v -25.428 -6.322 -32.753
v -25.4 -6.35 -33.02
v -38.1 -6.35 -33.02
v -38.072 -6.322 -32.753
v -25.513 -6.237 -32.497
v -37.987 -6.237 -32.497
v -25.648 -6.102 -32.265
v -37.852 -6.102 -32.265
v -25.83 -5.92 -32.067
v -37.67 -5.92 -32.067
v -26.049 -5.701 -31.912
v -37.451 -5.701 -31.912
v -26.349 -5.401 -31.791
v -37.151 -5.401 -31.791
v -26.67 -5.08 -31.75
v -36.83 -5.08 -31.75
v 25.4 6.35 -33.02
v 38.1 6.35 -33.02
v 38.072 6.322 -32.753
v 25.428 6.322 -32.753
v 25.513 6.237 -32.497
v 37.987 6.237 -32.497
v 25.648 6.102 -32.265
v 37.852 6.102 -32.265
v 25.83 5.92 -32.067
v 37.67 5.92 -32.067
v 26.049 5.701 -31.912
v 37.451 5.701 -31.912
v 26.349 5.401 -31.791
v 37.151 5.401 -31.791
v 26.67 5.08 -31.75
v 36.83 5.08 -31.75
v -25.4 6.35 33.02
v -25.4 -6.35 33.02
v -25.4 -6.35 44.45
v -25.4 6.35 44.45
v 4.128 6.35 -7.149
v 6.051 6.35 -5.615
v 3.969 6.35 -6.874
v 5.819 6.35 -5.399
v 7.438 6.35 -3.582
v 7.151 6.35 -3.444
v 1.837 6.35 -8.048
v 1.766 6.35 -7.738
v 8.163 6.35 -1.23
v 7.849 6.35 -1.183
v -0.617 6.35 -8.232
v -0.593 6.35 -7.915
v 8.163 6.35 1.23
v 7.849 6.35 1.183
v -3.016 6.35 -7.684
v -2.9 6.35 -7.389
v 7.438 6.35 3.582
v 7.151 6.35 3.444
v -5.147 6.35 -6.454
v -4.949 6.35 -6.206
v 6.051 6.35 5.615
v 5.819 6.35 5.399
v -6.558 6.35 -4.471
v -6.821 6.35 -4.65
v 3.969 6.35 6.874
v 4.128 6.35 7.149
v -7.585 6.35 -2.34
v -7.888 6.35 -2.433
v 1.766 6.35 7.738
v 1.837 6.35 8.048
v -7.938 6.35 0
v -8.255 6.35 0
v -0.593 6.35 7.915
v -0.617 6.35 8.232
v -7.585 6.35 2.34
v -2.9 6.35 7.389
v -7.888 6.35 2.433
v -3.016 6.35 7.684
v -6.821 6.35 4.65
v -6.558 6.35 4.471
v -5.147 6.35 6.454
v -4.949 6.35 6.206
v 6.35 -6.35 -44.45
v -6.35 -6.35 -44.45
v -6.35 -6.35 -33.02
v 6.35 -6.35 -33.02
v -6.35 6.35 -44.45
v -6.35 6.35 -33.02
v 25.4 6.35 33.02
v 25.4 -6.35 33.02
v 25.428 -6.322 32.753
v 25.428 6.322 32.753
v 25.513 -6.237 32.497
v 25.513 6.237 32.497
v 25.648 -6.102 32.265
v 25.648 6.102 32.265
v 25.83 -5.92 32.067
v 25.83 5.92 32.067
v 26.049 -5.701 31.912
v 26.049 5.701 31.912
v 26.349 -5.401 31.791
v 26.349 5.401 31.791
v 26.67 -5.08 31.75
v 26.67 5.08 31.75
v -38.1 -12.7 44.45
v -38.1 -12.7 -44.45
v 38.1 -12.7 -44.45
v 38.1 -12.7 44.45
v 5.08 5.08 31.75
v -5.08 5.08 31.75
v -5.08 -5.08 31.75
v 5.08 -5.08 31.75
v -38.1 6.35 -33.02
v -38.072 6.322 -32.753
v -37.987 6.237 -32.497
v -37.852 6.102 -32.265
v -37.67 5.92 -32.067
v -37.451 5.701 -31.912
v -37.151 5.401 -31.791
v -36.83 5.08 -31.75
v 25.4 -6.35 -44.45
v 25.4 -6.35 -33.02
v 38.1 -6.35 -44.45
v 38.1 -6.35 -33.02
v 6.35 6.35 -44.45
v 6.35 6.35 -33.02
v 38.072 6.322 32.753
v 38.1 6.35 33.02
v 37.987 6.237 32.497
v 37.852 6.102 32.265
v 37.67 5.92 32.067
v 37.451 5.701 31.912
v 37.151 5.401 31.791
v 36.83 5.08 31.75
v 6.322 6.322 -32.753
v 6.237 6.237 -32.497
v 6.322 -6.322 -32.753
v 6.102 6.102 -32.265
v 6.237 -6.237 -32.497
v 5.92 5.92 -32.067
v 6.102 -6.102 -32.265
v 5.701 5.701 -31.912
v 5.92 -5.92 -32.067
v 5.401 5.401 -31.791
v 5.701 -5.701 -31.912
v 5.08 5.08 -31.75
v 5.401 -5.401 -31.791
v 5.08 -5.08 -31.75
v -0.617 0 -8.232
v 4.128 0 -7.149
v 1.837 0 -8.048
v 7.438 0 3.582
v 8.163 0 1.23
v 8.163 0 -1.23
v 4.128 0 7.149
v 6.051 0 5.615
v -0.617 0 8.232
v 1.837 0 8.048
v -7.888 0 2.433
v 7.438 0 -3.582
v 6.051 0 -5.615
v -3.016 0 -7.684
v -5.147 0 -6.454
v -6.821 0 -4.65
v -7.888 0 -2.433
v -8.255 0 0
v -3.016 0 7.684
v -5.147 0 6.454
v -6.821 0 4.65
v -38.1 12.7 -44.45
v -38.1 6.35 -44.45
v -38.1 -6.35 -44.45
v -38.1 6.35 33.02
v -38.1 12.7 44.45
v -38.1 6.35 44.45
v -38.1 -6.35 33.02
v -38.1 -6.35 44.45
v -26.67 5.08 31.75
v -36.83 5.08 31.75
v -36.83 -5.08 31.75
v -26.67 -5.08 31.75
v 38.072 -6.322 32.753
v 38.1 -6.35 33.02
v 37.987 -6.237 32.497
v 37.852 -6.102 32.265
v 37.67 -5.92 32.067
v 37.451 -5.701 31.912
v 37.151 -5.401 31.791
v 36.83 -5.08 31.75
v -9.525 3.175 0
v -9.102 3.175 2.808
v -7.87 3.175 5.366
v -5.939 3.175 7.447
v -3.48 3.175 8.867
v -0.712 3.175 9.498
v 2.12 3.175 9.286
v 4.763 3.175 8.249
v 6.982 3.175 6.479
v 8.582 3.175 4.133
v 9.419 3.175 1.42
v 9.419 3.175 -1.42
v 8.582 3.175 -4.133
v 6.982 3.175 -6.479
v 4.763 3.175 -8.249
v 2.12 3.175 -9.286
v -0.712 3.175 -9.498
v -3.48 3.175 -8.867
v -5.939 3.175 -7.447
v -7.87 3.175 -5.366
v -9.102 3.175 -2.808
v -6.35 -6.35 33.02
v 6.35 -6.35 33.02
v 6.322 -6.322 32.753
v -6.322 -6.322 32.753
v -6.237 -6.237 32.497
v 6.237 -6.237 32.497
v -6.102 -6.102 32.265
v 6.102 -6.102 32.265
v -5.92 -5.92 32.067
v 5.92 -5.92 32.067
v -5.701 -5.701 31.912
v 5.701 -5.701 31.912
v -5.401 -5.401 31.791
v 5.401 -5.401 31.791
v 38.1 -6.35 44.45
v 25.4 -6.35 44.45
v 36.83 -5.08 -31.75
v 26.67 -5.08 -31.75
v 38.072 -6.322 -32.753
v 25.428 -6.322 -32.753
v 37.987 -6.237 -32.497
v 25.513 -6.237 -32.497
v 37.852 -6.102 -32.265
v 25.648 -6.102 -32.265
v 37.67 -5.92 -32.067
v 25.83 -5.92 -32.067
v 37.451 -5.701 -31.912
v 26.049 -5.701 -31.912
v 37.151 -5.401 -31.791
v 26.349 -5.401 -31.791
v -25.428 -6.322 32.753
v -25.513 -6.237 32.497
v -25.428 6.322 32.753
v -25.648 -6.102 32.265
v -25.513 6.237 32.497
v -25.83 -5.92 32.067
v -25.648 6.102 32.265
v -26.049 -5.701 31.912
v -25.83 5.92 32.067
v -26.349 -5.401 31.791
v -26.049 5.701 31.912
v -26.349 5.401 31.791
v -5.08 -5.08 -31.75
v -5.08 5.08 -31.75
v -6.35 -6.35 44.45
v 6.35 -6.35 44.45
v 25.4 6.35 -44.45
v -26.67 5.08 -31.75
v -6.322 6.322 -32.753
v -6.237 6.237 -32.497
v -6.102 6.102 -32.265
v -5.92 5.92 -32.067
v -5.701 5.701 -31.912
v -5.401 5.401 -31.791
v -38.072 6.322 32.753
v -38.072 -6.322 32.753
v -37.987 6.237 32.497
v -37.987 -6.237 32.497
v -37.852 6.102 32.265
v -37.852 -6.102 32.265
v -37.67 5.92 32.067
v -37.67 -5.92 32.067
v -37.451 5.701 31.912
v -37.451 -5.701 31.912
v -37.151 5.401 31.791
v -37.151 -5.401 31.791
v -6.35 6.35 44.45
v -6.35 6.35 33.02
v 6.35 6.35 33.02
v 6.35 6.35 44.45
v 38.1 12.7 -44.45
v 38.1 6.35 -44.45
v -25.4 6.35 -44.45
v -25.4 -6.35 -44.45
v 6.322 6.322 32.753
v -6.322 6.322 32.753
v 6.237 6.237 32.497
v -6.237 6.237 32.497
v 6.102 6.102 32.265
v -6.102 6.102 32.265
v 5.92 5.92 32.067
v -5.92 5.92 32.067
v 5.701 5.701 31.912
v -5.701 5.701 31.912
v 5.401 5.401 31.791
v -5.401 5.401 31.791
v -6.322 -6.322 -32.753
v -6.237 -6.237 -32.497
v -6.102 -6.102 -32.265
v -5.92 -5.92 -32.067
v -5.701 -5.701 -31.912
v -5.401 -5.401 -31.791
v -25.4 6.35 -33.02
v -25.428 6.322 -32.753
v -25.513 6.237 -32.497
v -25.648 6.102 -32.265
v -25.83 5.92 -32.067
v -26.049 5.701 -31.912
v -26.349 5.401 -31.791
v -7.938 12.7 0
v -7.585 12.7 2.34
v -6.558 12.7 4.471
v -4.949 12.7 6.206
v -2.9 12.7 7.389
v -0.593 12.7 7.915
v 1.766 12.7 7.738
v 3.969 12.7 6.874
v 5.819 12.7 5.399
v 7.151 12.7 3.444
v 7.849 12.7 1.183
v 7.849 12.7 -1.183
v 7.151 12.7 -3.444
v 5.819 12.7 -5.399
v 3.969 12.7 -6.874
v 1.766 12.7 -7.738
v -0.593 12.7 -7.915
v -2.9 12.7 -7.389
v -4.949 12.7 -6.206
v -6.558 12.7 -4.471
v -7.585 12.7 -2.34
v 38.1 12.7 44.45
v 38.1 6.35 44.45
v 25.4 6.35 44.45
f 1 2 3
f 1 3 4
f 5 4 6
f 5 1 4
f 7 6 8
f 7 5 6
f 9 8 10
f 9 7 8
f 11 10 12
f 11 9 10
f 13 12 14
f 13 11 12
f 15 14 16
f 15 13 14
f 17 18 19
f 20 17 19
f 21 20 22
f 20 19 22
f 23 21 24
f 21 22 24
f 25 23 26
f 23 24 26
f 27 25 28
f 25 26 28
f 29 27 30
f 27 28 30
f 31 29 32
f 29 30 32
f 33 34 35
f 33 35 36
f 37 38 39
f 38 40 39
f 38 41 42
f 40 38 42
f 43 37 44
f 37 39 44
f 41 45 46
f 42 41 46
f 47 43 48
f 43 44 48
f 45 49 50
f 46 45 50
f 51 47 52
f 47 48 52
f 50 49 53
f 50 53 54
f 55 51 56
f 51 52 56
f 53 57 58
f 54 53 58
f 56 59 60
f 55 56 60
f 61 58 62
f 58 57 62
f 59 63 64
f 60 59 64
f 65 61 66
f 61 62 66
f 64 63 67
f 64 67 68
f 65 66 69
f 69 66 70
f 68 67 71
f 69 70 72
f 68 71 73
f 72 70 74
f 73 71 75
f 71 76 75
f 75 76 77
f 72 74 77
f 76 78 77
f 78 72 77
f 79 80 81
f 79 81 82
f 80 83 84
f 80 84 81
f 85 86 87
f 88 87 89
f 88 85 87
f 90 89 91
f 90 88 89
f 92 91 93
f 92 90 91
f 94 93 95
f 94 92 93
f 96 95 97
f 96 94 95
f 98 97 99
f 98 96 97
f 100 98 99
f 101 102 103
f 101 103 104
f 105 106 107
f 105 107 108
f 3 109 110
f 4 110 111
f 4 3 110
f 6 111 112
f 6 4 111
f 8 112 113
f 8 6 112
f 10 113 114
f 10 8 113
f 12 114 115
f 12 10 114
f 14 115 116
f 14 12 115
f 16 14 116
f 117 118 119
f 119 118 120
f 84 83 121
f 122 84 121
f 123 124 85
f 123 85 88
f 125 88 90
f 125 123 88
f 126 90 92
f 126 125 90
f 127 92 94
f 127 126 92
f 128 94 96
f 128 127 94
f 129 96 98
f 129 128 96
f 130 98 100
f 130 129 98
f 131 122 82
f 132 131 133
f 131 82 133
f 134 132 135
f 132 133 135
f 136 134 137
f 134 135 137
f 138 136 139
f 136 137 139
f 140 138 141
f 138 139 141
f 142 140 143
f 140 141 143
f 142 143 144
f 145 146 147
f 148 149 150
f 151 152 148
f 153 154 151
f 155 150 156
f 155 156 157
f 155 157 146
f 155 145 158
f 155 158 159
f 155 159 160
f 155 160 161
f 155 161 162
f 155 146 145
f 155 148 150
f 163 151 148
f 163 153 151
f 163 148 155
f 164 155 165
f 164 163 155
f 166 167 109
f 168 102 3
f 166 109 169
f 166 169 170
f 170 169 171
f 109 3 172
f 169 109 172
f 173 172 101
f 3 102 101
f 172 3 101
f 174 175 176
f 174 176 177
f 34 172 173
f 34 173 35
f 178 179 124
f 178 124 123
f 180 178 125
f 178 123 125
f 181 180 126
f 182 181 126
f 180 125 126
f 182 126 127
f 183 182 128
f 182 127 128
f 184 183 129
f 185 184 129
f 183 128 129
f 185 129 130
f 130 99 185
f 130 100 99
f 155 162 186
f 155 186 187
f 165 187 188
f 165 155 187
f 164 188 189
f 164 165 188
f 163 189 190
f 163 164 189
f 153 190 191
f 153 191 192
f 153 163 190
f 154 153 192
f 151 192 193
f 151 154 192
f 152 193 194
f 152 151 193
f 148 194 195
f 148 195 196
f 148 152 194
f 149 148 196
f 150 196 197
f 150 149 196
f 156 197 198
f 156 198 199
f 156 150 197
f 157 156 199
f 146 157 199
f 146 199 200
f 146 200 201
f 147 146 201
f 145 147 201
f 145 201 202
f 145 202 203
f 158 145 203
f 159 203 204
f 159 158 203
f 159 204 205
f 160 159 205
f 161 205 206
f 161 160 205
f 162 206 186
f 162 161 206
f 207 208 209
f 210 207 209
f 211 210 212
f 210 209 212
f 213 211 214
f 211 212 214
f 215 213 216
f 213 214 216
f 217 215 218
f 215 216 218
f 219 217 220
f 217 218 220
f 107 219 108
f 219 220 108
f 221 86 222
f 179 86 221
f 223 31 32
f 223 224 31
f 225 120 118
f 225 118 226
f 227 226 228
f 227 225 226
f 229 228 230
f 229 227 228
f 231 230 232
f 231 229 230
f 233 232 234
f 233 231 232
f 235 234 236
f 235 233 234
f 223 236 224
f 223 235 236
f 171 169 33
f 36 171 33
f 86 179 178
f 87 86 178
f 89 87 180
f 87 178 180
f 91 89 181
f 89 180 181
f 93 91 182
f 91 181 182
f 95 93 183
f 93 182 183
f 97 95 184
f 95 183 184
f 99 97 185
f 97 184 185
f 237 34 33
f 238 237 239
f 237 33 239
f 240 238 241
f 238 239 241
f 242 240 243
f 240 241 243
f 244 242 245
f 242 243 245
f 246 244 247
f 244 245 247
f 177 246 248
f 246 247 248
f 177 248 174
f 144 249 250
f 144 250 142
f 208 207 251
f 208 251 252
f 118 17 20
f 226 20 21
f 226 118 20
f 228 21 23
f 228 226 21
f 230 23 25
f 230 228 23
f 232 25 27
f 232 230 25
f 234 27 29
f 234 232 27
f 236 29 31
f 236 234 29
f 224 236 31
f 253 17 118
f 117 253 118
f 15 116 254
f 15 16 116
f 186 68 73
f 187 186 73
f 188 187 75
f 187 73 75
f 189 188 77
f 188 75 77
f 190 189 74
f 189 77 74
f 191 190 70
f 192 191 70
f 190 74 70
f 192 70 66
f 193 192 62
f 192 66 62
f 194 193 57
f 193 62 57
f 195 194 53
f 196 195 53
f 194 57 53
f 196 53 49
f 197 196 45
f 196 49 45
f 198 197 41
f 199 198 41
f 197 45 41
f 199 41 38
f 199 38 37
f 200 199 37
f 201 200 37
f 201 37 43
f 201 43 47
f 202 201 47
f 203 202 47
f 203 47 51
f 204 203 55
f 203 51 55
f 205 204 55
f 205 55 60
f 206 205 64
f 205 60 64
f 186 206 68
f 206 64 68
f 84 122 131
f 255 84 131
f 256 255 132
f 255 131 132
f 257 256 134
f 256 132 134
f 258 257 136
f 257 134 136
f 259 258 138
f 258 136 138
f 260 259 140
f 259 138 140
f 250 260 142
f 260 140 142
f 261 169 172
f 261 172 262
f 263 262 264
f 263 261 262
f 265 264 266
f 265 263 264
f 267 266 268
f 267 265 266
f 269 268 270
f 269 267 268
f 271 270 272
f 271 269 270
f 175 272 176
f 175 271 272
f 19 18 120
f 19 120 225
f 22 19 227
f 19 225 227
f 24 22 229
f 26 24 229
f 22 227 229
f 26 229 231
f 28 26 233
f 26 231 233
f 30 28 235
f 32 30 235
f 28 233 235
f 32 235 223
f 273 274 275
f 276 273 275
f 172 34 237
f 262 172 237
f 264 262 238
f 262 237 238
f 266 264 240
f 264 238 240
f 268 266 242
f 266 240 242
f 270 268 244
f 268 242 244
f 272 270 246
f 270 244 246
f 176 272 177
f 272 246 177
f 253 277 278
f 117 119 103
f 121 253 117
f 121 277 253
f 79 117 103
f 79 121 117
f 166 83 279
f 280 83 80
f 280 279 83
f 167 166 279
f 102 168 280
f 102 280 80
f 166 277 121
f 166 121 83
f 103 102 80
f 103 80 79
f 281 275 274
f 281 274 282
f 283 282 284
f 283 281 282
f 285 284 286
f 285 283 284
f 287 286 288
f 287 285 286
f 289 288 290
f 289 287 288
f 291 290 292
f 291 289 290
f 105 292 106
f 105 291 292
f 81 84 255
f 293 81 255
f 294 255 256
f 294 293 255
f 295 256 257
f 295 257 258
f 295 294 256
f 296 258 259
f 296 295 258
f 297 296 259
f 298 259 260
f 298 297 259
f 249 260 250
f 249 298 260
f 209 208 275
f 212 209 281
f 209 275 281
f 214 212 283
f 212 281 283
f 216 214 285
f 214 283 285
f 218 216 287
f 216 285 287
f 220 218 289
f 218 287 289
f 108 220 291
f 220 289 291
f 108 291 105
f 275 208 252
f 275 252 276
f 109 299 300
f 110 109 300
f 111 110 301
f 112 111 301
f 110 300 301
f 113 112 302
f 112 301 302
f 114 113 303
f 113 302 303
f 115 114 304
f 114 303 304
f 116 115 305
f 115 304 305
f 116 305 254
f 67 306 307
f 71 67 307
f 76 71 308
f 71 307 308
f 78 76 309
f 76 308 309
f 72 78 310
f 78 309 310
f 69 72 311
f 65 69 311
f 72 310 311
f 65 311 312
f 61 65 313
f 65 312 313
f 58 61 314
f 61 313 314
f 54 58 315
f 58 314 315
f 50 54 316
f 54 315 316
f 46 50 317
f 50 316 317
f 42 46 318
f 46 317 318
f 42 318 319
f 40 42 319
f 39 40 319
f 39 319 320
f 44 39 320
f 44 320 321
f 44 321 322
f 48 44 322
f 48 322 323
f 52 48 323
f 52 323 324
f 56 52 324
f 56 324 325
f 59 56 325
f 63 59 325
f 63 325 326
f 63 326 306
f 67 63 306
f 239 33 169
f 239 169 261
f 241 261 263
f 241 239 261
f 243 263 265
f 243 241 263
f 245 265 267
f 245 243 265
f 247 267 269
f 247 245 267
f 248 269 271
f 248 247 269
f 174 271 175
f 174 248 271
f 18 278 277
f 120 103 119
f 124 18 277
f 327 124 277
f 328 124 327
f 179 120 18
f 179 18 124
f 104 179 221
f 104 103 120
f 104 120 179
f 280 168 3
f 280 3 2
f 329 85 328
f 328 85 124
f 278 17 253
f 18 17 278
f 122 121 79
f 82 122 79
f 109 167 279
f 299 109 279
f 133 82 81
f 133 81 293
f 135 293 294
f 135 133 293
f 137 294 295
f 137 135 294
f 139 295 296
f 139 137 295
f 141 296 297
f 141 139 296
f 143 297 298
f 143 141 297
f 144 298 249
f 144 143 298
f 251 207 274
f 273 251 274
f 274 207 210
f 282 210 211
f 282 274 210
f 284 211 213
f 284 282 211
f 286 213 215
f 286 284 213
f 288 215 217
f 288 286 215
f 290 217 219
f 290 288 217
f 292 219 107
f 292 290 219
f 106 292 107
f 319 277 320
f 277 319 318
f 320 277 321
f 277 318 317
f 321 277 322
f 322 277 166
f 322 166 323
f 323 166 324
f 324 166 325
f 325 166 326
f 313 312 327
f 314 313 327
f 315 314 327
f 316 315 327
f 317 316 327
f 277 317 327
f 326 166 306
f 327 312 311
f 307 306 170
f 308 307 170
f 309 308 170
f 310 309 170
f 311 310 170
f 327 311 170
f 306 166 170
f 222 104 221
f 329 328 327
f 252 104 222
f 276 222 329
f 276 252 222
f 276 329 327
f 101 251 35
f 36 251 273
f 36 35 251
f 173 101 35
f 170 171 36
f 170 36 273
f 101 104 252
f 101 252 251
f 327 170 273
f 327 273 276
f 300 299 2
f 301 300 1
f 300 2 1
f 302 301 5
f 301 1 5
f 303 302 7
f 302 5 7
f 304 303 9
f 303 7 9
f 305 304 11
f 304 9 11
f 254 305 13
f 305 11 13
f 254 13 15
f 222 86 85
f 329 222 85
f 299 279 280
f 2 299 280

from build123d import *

# Parameters (mm, degrees)
F0_W      = 76.2
F0_H      = 88.9
F1_DEPTH  = 12.7
F4_DEPTH  = 12.7
F2_W      = 12.7
F2_H      = 12.7
F3_W      = 12.7
F3_H      = 12.7
F5_DEPTH  = 12.7
F6_R      = 1.27
F7_DEPTH  = 12.7
F8_R      = 7.9375
F9_DEPTH  = 12.7
F10_R     = 9.525
F11_DEPTH = 6.35
F12_SIZE2 = 1.26999
F12_SIZE  = 3.17499


# Not quite as in the source:
# - a fillet or chamfer is up to 0.001 mm smaller than in the source, because OpenCascade refuses the exact size


with BuildPart() as f1:
    # F0 (on Front) → F1 (new body, symmetric)
    with BuildSketch(Plane.XZ):
        Rectangle(F0_W, F0_H)
    extrude(amount=F1_DEPTH, both=True)

    # F4 (add, symmetric): faces of the model
    f4_faces = [f1.faces().sort_by_distance(p)[0] for p in [
        (-38.1, 0, 0),
        (38.1, 0, 0),
    ]]
    extrude(f4_faces, amount=F4_DEPTH, both=True, dir=(-1, 0, 0))

    # F2 (on face) + F3 (on face) → F5 (cut, symmetric)
    with BuildSketch(Plane.XY.offset(44.45)):
        with Locations((-31.75, 0)):
            Rectangle(F2_W, F2_H)
        Rectangle(F2_W, F2_H)
        with Locations((31.75, 0)):
            Rectangle(F2_W, F2_H)
    with BuildSketch(Plane(origin=(0, 0, -44.45), x_dir=(1, 0, 0), z_dir=(0, 0, -1))):
        with Locations((-31.75, 0)):
            Rectangle(F3_W, F3_H)
        Rectangle(F3_W, F3_H)
        with Locations((31.75, 0)):
            Rectangle(F3_W, F3_H)
    extrude(amount=F5_DEPTH, both=True, dir=(0, 0, 1), mode=Mode.SUBTRACT)

    # F6
    f6_edges = [f1.edges().sort_by_distance(p)[0] for p in [
        (-38.1, 0, 31.75),
        (-31.75, -6.35, 31.75),
        (-25.4, 0, 31.75),
        (-31.75, 6.35, 31.75),
        (-6.35, 0, 31.75),
        (0, -6.35, 31.75),
        (6.35, 0, 31.75),
        (0, 6.35, 31.75),
        (31.75, -6.35, 31.75),
        (38.1, 0, 31.75),
        (31.75, 6.35, 31.75),
        (25.4, 0, 31.75),
        (-31.75, 6.35, -31.75),
        (-25.4, 0, -31.75),
        (-31.75, -6.35, -31.75),
        (-38.1, 0, -31.75),
        (6.35, 0, -31.75),
        (0, -6.35, -31.75),
        (-6.35, 0, -31.75),
        (0, 6.35, -31.75),
        (31.75, 6.35, -31.75),
        (38.1, 0, -31.75),
        (31.75, -6.35, -31.75),
        (25.4, 0, -31.75),
    ]]
    fillet(f6_edges, radius=F6_R)

    # F7 (cut, symmetric): faces of the model
    f7_faces = [f1.faces().sort_by_distance(p)[0] for p in [
        (50.8, 0, 0),
        (-50.8, 0, 0),
    ]]
    extrude(f7_faces, amount=F7_DEPTH, both=True, dir=(1, 0, 0), mode=Mode.SUBTRACT)

    # F8 (on face) → F9 (cut)
    with BuildSketch(Plane(origin=(0, 12.7, 0), x_dir=(-1, 0, 0), z_dir=(0, 1, 0))):
        Circle(F8_R)
    extrude(amount=-F9_DEPTH, mode=Mode.SUBTRACT)

    # F10 (on face) → F11 (cut)
    with BuildSketch(Plane(origin=(0, 0, 0), x_dir=(-1, 0, 0), z_dir=(0, 1, 0))):
        Circle(F10_R)
    extrude(amount=F11_DEPTH, mode=Mode.SUBTRACT)

    # F12 (size 3.175 and 1.27 in the source; OpenCascade refuses exactly that, so slightly less here)
    f12_edges = [f1.edges().sort_by_distance(p)[0] for p in [
        (9.525, 0, 0),
        (9.525, 6.35, 0),
    ]]
    f12_side = f1.faces().sort_by_distance((9.525, 3.175, 0))[0]
    chamfer(f12_edges, length=F12_SIZE, length2=F12_SIZE2, reference=f12_side)


solid = f1.part
